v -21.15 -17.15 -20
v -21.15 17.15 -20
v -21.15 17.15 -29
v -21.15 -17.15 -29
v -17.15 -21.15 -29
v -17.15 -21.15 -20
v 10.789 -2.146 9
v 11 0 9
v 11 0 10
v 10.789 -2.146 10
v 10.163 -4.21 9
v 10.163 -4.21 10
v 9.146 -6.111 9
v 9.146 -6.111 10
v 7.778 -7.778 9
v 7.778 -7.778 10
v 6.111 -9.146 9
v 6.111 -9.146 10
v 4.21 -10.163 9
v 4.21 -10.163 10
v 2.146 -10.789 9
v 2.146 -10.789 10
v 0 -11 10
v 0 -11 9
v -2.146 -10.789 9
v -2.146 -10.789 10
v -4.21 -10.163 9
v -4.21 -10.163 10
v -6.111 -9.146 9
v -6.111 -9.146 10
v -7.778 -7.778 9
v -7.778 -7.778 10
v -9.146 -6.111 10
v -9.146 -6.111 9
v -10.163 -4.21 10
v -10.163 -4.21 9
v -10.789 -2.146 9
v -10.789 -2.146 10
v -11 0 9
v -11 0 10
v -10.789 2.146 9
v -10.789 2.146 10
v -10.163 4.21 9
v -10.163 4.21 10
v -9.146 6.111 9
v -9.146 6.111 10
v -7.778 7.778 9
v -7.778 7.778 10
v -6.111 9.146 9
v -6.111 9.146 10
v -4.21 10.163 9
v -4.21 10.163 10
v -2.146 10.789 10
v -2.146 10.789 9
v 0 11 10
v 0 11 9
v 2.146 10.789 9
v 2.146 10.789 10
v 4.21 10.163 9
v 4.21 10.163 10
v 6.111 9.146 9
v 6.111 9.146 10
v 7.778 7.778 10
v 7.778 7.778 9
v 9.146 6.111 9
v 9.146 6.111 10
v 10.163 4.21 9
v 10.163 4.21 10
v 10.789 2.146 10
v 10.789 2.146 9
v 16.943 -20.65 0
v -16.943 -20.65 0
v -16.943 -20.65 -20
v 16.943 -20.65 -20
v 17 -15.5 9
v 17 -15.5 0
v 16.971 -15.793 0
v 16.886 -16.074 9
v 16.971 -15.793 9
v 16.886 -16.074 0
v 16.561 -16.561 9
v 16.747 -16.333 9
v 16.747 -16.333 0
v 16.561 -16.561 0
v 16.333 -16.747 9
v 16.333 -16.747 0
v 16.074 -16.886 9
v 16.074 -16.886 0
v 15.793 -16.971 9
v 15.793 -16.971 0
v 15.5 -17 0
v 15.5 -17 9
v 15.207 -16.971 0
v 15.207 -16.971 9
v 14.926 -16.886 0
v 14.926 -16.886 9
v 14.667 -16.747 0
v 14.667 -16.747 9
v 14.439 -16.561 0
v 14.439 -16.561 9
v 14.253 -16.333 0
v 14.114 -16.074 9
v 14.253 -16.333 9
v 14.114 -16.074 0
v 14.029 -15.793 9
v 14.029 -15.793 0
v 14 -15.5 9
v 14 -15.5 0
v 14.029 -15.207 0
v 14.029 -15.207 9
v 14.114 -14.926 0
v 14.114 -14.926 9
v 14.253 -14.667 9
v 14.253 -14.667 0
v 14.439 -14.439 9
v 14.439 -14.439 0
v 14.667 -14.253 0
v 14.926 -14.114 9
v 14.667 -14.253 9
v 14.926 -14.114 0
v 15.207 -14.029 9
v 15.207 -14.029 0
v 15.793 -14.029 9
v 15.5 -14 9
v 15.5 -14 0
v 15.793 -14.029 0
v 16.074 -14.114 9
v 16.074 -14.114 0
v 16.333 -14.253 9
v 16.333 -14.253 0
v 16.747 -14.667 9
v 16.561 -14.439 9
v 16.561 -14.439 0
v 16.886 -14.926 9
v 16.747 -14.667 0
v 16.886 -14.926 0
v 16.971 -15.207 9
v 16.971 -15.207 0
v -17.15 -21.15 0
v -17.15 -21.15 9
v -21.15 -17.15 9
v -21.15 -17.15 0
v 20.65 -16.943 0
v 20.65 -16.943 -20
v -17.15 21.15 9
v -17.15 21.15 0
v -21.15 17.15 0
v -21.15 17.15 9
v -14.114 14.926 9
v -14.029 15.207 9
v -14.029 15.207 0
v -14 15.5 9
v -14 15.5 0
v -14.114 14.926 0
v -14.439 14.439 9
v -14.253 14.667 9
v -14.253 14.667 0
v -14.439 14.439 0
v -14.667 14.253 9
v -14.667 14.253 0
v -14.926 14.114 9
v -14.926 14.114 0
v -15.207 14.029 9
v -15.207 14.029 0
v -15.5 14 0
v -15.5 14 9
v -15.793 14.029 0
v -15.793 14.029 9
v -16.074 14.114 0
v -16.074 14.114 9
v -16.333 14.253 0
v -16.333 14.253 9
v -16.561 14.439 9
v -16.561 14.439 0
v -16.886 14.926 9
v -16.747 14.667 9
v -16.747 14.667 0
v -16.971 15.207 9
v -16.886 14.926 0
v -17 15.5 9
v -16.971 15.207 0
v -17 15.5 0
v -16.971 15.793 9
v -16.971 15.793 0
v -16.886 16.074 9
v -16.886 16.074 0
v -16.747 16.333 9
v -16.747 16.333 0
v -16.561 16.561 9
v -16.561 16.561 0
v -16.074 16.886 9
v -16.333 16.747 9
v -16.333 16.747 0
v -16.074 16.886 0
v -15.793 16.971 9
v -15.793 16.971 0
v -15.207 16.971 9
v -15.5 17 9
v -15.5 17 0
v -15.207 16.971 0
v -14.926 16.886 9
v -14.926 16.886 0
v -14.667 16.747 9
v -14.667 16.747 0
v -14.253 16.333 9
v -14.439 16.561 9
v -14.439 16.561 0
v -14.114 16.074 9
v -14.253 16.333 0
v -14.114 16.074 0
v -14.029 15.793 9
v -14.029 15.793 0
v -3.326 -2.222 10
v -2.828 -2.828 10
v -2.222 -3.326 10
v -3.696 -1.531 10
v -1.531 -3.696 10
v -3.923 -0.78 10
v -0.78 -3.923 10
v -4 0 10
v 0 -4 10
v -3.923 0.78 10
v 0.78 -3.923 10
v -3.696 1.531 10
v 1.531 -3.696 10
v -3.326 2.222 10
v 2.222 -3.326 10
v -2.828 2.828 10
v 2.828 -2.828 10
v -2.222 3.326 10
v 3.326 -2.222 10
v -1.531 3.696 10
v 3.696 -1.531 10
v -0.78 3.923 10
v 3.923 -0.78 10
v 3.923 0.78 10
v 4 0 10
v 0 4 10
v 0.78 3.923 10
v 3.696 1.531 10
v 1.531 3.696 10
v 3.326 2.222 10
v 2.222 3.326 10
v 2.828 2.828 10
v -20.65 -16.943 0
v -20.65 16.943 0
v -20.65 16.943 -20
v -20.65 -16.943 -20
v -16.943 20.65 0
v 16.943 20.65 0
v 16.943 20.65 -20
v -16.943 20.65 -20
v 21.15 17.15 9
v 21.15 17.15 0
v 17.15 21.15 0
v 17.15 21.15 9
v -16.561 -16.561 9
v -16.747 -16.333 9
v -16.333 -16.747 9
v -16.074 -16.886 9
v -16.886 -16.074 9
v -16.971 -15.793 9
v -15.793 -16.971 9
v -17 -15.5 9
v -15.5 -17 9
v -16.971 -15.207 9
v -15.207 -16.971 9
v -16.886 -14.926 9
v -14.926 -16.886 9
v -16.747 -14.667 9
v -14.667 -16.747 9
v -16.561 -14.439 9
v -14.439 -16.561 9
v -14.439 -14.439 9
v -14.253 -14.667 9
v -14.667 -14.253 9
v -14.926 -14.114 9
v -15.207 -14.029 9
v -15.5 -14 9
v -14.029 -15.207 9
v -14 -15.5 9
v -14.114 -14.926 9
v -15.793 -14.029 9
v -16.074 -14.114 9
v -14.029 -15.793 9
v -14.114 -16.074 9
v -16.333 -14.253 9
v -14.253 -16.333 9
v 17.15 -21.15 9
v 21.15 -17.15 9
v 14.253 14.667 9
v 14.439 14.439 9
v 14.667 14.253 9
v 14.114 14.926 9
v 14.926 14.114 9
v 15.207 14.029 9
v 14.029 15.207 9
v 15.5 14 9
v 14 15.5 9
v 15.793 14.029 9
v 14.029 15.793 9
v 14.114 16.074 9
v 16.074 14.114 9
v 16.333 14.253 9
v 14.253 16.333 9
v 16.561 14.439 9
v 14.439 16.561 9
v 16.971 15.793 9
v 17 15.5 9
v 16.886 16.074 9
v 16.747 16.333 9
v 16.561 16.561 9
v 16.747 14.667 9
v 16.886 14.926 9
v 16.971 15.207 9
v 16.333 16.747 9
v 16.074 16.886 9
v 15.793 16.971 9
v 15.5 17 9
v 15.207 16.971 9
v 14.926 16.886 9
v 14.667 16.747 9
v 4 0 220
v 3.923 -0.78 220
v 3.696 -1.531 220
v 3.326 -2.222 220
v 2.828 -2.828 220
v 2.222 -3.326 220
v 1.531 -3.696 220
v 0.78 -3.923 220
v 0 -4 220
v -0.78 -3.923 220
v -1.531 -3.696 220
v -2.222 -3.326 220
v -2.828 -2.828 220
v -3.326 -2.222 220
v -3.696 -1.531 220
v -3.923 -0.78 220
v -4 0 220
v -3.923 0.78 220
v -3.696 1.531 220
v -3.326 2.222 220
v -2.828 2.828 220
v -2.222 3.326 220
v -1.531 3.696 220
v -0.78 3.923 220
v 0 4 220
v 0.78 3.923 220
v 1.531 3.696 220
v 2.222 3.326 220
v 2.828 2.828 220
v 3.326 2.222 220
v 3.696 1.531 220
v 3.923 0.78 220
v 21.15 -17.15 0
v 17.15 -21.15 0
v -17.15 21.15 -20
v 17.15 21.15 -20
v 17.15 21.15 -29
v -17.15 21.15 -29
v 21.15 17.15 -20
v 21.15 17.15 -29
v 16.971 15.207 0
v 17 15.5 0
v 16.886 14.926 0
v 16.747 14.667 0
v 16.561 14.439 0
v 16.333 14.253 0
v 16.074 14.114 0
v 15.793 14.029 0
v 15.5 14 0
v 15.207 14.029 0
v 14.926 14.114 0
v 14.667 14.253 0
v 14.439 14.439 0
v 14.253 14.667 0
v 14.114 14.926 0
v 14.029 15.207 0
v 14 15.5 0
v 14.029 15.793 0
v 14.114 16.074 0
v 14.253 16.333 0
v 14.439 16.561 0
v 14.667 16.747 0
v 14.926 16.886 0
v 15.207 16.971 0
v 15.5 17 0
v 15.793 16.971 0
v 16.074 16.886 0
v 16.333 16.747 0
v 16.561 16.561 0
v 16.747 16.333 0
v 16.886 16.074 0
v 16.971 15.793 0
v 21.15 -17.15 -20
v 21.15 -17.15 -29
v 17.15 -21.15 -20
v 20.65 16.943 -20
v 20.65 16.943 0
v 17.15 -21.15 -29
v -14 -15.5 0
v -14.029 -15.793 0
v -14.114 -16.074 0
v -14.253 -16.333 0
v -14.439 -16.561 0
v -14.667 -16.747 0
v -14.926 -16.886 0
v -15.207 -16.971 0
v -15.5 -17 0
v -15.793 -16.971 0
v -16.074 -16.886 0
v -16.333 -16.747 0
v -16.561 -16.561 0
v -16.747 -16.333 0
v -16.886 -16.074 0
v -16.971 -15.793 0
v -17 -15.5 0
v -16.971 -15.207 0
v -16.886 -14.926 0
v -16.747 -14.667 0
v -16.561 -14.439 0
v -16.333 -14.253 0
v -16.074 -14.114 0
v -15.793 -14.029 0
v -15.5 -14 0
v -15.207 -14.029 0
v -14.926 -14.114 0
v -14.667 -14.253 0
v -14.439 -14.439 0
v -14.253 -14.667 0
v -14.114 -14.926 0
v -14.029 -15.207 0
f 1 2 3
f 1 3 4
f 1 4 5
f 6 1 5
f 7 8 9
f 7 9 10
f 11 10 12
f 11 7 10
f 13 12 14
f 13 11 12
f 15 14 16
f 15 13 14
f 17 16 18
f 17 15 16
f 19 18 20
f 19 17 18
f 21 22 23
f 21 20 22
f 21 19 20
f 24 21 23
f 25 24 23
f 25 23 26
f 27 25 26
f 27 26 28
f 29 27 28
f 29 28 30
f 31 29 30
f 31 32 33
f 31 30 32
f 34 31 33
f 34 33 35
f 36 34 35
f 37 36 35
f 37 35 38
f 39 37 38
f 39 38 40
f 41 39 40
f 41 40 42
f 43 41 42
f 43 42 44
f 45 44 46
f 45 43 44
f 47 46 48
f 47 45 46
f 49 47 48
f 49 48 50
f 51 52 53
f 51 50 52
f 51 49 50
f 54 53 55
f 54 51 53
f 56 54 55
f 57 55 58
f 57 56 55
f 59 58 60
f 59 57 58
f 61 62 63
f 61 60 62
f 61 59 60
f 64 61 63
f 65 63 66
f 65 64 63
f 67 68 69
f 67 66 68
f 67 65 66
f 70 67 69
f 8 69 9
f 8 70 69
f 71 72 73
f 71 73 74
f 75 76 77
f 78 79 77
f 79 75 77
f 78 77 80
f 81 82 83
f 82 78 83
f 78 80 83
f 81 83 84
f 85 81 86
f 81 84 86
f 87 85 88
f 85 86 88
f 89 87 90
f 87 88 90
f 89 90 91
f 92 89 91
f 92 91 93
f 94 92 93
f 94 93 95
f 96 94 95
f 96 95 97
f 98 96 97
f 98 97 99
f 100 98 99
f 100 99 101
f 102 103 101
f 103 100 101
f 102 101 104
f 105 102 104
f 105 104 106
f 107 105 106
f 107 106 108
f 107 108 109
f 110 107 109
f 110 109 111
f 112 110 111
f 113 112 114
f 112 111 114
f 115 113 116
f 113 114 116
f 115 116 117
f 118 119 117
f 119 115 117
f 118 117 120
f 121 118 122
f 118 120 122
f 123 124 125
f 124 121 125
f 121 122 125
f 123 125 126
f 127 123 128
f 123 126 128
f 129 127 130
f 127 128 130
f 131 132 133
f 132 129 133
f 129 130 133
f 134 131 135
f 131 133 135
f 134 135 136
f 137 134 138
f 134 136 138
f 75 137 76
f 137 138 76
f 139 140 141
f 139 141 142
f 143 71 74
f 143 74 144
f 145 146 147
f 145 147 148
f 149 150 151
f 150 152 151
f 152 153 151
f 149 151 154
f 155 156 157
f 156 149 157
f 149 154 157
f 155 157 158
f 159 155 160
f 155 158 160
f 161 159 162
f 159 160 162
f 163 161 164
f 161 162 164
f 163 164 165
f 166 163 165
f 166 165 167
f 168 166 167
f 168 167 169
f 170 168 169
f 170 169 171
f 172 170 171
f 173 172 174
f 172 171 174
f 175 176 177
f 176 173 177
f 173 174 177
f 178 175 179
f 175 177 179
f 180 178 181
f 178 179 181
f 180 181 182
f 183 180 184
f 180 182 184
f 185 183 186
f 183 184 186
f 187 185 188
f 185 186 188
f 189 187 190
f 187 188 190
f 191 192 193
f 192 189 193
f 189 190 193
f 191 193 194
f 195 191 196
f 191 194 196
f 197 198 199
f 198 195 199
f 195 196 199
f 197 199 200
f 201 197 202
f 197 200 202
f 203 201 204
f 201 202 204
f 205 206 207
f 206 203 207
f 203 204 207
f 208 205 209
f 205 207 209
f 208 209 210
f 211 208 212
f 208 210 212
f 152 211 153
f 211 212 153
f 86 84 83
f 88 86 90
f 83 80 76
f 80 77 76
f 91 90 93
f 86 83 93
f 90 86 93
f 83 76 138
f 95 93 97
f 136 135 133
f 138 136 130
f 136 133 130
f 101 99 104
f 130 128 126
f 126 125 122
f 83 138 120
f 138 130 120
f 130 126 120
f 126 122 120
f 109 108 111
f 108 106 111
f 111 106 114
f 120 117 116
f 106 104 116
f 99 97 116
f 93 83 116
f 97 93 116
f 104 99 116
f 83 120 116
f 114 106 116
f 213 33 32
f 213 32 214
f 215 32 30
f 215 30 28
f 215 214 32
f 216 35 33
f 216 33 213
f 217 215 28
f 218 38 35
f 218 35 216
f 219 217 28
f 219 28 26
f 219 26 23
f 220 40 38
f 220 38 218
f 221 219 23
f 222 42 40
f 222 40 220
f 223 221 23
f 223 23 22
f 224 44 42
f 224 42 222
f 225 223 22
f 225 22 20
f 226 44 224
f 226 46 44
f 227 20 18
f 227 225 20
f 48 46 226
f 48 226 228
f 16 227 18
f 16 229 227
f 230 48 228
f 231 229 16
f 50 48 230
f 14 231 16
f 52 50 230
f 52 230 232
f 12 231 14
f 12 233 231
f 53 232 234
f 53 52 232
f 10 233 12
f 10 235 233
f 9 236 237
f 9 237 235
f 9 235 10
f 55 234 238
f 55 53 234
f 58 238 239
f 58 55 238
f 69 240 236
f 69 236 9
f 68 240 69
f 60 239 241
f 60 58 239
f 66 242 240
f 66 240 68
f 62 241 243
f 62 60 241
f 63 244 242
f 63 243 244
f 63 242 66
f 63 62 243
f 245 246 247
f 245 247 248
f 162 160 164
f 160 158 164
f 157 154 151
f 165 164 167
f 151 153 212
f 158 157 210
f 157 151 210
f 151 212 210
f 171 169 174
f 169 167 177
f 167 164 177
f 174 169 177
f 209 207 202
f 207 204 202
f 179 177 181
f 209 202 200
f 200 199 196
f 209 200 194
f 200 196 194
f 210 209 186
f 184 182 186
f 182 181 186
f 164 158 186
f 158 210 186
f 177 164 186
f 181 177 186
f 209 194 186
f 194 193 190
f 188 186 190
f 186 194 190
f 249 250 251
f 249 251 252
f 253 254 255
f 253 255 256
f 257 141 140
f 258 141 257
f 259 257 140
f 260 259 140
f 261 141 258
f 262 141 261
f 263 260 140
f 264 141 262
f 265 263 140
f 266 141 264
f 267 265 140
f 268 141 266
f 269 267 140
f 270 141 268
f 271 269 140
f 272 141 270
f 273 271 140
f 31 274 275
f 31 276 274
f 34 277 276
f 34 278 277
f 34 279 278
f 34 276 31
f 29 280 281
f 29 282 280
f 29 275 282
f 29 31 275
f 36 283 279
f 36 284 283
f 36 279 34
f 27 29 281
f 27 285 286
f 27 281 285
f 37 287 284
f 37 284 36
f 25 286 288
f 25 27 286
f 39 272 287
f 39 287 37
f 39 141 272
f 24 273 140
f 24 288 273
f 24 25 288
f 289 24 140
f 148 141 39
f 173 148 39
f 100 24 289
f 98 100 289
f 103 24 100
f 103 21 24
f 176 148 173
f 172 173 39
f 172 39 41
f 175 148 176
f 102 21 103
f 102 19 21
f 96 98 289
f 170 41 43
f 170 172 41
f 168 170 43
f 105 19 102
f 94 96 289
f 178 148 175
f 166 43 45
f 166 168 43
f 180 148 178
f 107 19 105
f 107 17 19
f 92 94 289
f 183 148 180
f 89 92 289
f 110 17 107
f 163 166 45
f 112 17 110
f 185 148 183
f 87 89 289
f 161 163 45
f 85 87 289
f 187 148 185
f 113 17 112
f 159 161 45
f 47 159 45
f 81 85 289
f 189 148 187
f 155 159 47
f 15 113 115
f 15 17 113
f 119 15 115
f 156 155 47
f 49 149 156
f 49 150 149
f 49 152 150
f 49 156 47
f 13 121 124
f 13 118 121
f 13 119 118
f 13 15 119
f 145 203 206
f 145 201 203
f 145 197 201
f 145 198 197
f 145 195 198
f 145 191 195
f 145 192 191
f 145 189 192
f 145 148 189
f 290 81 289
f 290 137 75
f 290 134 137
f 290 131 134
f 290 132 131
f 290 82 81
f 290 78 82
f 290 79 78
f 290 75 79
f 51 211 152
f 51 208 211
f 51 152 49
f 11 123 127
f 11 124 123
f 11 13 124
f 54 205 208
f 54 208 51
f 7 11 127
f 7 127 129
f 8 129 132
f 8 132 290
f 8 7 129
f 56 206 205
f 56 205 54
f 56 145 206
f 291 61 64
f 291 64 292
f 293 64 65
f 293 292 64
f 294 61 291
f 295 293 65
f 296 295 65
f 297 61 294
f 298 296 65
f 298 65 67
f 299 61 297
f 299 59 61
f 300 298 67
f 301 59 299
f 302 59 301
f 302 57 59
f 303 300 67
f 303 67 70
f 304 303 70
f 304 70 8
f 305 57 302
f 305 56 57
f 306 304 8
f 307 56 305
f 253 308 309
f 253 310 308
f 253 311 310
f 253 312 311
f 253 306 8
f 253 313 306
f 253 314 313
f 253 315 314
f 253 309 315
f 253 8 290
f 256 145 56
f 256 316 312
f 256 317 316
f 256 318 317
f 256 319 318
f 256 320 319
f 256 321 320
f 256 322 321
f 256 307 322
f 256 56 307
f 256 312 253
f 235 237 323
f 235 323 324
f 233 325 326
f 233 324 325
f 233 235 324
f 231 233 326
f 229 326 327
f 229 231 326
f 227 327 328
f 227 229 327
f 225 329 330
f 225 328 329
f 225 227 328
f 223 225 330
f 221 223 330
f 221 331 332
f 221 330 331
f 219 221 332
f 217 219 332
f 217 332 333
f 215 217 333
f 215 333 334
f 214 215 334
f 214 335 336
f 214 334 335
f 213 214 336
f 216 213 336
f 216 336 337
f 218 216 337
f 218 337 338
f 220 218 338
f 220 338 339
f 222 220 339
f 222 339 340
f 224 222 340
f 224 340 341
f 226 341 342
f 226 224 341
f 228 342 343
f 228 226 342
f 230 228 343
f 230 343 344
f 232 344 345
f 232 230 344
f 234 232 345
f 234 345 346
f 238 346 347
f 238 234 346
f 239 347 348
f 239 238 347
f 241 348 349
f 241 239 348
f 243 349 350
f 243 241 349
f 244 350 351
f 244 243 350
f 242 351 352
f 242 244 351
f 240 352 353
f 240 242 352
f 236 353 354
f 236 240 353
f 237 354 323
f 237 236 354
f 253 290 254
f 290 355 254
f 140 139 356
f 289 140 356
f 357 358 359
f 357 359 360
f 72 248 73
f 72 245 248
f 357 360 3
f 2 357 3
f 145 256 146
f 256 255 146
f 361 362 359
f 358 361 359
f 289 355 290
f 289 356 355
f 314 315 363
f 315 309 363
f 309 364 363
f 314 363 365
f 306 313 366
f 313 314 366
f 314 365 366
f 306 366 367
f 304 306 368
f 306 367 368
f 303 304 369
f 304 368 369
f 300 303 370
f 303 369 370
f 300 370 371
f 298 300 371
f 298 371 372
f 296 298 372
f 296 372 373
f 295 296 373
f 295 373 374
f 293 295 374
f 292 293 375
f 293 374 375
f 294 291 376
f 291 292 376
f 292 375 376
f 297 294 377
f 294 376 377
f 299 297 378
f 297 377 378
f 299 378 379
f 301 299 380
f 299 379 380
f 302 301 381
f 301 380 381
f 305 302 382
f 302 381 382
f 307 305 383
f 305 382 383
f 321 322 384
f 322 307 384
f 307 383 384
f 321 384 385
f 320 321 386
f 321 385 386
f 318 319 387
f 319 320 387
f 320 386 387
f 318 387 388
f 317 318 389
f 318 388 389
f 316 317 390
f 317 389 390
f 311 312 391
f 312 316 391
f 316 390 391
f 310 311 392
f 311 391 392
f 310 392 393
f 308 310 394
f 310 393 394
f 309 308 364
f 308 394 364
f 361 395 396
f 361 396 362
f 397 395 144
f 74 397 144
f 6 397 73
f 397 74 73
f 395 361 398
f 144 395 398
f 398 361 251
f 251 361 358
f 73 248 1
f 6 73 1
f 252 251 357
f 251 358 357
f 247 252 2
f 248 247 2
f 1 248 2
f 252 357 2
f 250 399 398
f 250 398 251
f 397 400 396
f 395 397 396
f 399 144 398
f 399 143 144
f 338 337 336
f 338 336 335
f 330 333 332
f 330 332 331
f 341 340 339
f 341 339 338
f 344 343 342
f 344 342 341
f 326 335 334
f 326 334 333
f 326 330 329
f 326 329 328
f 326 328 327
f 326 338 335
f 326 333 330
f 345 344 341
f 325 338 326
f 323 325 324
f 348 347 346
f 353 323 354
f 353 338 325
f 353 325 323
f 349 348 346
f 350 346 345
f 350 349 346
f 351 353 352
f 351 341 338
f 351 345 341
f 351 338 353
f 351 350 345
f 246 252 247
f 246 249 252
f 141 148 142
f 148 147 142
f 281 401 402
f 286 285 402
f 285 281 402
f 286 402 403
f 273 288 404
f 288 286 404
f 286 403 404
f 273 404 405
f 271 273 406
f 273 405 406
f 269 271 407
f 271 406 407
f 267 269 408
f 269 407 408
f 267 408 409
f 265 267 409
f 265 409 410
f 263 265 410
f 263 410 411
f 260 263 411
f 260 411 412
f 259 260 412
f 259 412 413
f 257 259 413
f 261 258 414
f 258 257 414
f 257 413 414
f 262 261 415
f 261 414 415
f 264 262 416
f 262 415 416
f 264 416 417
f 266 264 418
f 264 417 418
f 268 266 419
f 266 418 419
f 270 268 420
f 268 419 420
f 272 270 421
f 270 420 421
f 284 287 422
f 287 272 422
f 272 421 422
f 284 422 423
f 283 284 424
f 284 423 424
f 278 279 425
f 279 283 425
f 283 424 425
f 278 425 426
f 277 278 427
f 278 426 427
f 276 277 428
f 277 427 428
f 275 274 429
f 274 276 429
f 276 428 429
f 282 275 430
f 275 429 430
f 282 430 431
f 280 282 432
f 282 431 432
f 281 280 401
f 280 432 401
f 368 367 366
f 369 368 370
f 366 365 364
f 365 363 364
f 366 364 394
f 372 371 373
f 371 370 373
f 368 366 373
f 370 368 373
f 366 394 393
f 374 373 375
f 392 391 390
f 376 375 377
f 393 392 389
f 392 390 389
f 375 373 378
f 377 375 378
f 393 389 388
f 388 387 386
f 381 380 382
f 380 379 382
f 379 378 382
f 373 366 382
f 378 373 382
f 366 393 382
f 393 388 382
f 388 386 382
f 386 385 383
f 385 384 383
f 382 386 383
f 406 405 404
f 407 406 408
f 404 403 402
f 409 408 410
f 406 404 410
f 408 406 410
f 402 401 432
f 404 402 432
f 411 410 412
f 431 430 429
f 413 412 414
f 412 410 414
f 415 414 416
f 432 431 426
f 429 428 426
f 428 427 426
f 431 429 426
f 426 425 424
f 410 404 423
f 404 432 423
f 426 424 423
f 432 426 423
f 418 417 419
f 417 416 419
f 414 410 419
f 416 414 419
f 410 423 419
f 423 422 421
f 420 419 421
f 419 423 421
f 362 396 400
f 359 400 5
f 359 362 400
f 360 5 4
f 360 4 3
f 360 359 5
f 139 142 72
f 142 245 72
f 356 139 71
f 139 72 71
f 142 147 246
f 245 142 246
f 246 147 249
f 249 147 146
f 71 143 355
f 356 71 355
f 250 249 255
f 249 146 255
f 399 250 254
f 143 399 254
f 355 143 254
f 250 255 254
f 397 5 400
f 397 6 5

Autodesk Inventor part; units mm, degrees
ref_plane "YZ Plane" through (0, 0, 0) normal (1, 0, 0) x (0, 1, 0)
ref_plane "XZ Plane" through (0, 0, 0) normal (0, 1, 0) x (-1, 0, 0)
ref_plane "XY Plane" through (0, 0, 0) normal (0, 0, 1) x (1, 0, 0)
sketch "Sketch1" plane through (0, 0, 0) normal (0, 0, 1) x (1, 0, 0)
  line L0 (-21.15, -21.15) -> (21.15, -21.15)
  line L1 (21.15, -21.15) -> (21.15, 21.15)
  line L2 (21.15, 21.15) -> (-21.15, 21.15)
  line L3 (-21.15, 21.15) -> (-21.15, -21.15)
  line L4 (-21.15, -21.15) -> (21.15, 21.15) construction
  line L5 (21.15, -21.15) -> (-21.15, 21.15) construction
  line L6 (-15.5, -15.5) -> (15.5, -15.5) construction
  line L7 (15.5, -15.5) -> (15.5, 15.5) construction
  line L8 (15.5, 15.5) -> (-15.5, 15.5) construction
  line L9 (-15.5, 15.5) -> (-15.5, -15.5) construction
  line L10 (-15.5, -15.5) -> (15.5, 15.5) construction
  line L11 (15.5, -15.5) -> (-15.5, 15.5) construction
  circle A0 centre (-15.5, 15.5) radius 1.5
  circle A1 centre (15.5, 15.5) radius 1.5
  circle A2 centre (15.5, -15.5) radius 1.5
  circle A3 centre (-15.5, -15.5) radius 1.5
  point P0 (0, 0)
  dimension "d0" = 42.3
  dimension "d1" = 31
  dimension "d2" = 3
extrude "Extrusion1" add sketch "Sketch1" along normal blind 9
chamfer "Chamfer1" distance 4 angle 45 4 edges at (21.15, 21.15, 4.5) (21.15, -21.15, 4.5) (-21.15, 21.15, 4.5) (-21.15, -21.15, 4.5)
sketch "Sketch3" plane through (0, 0, 0) normal (0, 0, -1) x (-1, 0, 0)
  circle A0 centre (15.5, 15.5) radius 1.5 projected
  line L0 (21.15, 17.15) -> (21.15, -17.15) projected
  line L1 (17.15, 21.15) -> (21.15, 17.15) projected
  line L2 (-17.15, 21.15) -> (17.15, 21.15) projected
  line L3 (-21.15, 17.15) -> (-17.15, 21.15) projected
  line L4 (-21.15, -17.15) -> (-21.15, 17.15) projected
  circle A1 centre (15.5, -15.5) radius 1.5 projected
  circle A2 centre (-15.5, -15.5) radius 1.5 projected
  circle A3 centre (-15.5, 15.5) radius 1.5 projected
  circle A4 centre (15.5, 15.5) radius 1.5 projected
  line L5 (21.15, -17.15) -> (17.15, -21.15) projected
  line L6 (21.15, 17.15) -> (21.15, -17.15) projected
  line L7 (17.15, 21.15) -> (21.15, 17.15) projected
  line L8 (-17.15, 21.15) -> (17.15, 21.15) projected
  line L9 (-21.15, 17.15) -> (-17.15, 21.15) projected
  line L10 (-21.15, -17.15) -> (-21.15, 17.15) projected
  line L11 (-17.15, -21.15) -> (-21.15, -17.15) projected
  line L12 (17.15, -21.15) -> (-17.15, -21.15) projected
  line L13 (-20.65, 16.9429) -> (-16.9429, 20.65)
  line L14 (-16.9429, 20.65) -> (16.9429, 20.65)
  line L15 (16.9429, 20.65) -> (20.65, 16.9429)
  line L16 (20.65, 16.9429) -> (20.65, -16.9429)
  line L17 (20.65, -16.9429) -> (16.9429, -20.65)
  line L18 (16.9429, -20.65) -> (-16.9429, -20.65)
  line L19 (-16.9429, -20.65) -> (-20.65, -16.9429)
  line L20 (-20.65, -16.9429) -> (-20.65, 16.9429)
  point P0 (0, 0)
  dimension "d8" = 0.5
  dimension "d10" = 0.5
  dimension "d11" = 0.5
  dimension "d12" = 0.5
extrude "Extrusion2" add sketch "Sketch3" along normal blind 20 contours A0 | A1 | A2 | A3 | L13 L14 L15 L16 L17 L18 L19 L20
sketch "Sketch4" plane through (0, 0, -20) normal (0, 0, -1) x (-1, 0, 0)
  line L0 (-21.15, 17.15) -> (-17.15, 21.15) projected
  line L1 (-17.15, 21.15) -> (17.15, 21.15) projected
  line L2 (17.15, 21.15) -> (21.15, 17.15) projected
  line L3 (21.15, 17.15) -> (21.15, -17.15) projected
  line L4 (21.15, -17.15) -> (17.15, -21.15) projected
  line L5 (17.15, -21.15) -> (-17.15, -21.15) projected
  line L6 (-17.15, -21.15) -> (-21.15, -17.15) projected
  line L7 (-21.15, -17.15) -> (-21.15, 17.15) projected
  point P0 (0, 0)
extrude "Extrusion3" add sketch "Sketch4" along normal blind 9
sketch "Sketch5" plane through (0, 0, 9) normal (0, 0, 1) x (1, 0, 0)
  circle A0 centre (0, 0) radius 11
  dimension "d17" = 22
extrude "Extrusion4" add sketch "Sketch5" along normal blind 1
sketch "Sketch6" plane through (0, 0, 10) normal (0, 0, 1) x (1, 0, 0)
  circle A0 centre (0, 0) radius 11 projected
  circle A1 centre (0, 0) radius 4
  dimension "d20" = 8
extrude "Extrusion5" add sketch "Sketch6" along normal blind 210 contours A1
equation "\"d10\" = d8"
equation "\"d11\" = d8"
equation "\"d12\" = d8"
properties part number "StepperDrive-210mm"
